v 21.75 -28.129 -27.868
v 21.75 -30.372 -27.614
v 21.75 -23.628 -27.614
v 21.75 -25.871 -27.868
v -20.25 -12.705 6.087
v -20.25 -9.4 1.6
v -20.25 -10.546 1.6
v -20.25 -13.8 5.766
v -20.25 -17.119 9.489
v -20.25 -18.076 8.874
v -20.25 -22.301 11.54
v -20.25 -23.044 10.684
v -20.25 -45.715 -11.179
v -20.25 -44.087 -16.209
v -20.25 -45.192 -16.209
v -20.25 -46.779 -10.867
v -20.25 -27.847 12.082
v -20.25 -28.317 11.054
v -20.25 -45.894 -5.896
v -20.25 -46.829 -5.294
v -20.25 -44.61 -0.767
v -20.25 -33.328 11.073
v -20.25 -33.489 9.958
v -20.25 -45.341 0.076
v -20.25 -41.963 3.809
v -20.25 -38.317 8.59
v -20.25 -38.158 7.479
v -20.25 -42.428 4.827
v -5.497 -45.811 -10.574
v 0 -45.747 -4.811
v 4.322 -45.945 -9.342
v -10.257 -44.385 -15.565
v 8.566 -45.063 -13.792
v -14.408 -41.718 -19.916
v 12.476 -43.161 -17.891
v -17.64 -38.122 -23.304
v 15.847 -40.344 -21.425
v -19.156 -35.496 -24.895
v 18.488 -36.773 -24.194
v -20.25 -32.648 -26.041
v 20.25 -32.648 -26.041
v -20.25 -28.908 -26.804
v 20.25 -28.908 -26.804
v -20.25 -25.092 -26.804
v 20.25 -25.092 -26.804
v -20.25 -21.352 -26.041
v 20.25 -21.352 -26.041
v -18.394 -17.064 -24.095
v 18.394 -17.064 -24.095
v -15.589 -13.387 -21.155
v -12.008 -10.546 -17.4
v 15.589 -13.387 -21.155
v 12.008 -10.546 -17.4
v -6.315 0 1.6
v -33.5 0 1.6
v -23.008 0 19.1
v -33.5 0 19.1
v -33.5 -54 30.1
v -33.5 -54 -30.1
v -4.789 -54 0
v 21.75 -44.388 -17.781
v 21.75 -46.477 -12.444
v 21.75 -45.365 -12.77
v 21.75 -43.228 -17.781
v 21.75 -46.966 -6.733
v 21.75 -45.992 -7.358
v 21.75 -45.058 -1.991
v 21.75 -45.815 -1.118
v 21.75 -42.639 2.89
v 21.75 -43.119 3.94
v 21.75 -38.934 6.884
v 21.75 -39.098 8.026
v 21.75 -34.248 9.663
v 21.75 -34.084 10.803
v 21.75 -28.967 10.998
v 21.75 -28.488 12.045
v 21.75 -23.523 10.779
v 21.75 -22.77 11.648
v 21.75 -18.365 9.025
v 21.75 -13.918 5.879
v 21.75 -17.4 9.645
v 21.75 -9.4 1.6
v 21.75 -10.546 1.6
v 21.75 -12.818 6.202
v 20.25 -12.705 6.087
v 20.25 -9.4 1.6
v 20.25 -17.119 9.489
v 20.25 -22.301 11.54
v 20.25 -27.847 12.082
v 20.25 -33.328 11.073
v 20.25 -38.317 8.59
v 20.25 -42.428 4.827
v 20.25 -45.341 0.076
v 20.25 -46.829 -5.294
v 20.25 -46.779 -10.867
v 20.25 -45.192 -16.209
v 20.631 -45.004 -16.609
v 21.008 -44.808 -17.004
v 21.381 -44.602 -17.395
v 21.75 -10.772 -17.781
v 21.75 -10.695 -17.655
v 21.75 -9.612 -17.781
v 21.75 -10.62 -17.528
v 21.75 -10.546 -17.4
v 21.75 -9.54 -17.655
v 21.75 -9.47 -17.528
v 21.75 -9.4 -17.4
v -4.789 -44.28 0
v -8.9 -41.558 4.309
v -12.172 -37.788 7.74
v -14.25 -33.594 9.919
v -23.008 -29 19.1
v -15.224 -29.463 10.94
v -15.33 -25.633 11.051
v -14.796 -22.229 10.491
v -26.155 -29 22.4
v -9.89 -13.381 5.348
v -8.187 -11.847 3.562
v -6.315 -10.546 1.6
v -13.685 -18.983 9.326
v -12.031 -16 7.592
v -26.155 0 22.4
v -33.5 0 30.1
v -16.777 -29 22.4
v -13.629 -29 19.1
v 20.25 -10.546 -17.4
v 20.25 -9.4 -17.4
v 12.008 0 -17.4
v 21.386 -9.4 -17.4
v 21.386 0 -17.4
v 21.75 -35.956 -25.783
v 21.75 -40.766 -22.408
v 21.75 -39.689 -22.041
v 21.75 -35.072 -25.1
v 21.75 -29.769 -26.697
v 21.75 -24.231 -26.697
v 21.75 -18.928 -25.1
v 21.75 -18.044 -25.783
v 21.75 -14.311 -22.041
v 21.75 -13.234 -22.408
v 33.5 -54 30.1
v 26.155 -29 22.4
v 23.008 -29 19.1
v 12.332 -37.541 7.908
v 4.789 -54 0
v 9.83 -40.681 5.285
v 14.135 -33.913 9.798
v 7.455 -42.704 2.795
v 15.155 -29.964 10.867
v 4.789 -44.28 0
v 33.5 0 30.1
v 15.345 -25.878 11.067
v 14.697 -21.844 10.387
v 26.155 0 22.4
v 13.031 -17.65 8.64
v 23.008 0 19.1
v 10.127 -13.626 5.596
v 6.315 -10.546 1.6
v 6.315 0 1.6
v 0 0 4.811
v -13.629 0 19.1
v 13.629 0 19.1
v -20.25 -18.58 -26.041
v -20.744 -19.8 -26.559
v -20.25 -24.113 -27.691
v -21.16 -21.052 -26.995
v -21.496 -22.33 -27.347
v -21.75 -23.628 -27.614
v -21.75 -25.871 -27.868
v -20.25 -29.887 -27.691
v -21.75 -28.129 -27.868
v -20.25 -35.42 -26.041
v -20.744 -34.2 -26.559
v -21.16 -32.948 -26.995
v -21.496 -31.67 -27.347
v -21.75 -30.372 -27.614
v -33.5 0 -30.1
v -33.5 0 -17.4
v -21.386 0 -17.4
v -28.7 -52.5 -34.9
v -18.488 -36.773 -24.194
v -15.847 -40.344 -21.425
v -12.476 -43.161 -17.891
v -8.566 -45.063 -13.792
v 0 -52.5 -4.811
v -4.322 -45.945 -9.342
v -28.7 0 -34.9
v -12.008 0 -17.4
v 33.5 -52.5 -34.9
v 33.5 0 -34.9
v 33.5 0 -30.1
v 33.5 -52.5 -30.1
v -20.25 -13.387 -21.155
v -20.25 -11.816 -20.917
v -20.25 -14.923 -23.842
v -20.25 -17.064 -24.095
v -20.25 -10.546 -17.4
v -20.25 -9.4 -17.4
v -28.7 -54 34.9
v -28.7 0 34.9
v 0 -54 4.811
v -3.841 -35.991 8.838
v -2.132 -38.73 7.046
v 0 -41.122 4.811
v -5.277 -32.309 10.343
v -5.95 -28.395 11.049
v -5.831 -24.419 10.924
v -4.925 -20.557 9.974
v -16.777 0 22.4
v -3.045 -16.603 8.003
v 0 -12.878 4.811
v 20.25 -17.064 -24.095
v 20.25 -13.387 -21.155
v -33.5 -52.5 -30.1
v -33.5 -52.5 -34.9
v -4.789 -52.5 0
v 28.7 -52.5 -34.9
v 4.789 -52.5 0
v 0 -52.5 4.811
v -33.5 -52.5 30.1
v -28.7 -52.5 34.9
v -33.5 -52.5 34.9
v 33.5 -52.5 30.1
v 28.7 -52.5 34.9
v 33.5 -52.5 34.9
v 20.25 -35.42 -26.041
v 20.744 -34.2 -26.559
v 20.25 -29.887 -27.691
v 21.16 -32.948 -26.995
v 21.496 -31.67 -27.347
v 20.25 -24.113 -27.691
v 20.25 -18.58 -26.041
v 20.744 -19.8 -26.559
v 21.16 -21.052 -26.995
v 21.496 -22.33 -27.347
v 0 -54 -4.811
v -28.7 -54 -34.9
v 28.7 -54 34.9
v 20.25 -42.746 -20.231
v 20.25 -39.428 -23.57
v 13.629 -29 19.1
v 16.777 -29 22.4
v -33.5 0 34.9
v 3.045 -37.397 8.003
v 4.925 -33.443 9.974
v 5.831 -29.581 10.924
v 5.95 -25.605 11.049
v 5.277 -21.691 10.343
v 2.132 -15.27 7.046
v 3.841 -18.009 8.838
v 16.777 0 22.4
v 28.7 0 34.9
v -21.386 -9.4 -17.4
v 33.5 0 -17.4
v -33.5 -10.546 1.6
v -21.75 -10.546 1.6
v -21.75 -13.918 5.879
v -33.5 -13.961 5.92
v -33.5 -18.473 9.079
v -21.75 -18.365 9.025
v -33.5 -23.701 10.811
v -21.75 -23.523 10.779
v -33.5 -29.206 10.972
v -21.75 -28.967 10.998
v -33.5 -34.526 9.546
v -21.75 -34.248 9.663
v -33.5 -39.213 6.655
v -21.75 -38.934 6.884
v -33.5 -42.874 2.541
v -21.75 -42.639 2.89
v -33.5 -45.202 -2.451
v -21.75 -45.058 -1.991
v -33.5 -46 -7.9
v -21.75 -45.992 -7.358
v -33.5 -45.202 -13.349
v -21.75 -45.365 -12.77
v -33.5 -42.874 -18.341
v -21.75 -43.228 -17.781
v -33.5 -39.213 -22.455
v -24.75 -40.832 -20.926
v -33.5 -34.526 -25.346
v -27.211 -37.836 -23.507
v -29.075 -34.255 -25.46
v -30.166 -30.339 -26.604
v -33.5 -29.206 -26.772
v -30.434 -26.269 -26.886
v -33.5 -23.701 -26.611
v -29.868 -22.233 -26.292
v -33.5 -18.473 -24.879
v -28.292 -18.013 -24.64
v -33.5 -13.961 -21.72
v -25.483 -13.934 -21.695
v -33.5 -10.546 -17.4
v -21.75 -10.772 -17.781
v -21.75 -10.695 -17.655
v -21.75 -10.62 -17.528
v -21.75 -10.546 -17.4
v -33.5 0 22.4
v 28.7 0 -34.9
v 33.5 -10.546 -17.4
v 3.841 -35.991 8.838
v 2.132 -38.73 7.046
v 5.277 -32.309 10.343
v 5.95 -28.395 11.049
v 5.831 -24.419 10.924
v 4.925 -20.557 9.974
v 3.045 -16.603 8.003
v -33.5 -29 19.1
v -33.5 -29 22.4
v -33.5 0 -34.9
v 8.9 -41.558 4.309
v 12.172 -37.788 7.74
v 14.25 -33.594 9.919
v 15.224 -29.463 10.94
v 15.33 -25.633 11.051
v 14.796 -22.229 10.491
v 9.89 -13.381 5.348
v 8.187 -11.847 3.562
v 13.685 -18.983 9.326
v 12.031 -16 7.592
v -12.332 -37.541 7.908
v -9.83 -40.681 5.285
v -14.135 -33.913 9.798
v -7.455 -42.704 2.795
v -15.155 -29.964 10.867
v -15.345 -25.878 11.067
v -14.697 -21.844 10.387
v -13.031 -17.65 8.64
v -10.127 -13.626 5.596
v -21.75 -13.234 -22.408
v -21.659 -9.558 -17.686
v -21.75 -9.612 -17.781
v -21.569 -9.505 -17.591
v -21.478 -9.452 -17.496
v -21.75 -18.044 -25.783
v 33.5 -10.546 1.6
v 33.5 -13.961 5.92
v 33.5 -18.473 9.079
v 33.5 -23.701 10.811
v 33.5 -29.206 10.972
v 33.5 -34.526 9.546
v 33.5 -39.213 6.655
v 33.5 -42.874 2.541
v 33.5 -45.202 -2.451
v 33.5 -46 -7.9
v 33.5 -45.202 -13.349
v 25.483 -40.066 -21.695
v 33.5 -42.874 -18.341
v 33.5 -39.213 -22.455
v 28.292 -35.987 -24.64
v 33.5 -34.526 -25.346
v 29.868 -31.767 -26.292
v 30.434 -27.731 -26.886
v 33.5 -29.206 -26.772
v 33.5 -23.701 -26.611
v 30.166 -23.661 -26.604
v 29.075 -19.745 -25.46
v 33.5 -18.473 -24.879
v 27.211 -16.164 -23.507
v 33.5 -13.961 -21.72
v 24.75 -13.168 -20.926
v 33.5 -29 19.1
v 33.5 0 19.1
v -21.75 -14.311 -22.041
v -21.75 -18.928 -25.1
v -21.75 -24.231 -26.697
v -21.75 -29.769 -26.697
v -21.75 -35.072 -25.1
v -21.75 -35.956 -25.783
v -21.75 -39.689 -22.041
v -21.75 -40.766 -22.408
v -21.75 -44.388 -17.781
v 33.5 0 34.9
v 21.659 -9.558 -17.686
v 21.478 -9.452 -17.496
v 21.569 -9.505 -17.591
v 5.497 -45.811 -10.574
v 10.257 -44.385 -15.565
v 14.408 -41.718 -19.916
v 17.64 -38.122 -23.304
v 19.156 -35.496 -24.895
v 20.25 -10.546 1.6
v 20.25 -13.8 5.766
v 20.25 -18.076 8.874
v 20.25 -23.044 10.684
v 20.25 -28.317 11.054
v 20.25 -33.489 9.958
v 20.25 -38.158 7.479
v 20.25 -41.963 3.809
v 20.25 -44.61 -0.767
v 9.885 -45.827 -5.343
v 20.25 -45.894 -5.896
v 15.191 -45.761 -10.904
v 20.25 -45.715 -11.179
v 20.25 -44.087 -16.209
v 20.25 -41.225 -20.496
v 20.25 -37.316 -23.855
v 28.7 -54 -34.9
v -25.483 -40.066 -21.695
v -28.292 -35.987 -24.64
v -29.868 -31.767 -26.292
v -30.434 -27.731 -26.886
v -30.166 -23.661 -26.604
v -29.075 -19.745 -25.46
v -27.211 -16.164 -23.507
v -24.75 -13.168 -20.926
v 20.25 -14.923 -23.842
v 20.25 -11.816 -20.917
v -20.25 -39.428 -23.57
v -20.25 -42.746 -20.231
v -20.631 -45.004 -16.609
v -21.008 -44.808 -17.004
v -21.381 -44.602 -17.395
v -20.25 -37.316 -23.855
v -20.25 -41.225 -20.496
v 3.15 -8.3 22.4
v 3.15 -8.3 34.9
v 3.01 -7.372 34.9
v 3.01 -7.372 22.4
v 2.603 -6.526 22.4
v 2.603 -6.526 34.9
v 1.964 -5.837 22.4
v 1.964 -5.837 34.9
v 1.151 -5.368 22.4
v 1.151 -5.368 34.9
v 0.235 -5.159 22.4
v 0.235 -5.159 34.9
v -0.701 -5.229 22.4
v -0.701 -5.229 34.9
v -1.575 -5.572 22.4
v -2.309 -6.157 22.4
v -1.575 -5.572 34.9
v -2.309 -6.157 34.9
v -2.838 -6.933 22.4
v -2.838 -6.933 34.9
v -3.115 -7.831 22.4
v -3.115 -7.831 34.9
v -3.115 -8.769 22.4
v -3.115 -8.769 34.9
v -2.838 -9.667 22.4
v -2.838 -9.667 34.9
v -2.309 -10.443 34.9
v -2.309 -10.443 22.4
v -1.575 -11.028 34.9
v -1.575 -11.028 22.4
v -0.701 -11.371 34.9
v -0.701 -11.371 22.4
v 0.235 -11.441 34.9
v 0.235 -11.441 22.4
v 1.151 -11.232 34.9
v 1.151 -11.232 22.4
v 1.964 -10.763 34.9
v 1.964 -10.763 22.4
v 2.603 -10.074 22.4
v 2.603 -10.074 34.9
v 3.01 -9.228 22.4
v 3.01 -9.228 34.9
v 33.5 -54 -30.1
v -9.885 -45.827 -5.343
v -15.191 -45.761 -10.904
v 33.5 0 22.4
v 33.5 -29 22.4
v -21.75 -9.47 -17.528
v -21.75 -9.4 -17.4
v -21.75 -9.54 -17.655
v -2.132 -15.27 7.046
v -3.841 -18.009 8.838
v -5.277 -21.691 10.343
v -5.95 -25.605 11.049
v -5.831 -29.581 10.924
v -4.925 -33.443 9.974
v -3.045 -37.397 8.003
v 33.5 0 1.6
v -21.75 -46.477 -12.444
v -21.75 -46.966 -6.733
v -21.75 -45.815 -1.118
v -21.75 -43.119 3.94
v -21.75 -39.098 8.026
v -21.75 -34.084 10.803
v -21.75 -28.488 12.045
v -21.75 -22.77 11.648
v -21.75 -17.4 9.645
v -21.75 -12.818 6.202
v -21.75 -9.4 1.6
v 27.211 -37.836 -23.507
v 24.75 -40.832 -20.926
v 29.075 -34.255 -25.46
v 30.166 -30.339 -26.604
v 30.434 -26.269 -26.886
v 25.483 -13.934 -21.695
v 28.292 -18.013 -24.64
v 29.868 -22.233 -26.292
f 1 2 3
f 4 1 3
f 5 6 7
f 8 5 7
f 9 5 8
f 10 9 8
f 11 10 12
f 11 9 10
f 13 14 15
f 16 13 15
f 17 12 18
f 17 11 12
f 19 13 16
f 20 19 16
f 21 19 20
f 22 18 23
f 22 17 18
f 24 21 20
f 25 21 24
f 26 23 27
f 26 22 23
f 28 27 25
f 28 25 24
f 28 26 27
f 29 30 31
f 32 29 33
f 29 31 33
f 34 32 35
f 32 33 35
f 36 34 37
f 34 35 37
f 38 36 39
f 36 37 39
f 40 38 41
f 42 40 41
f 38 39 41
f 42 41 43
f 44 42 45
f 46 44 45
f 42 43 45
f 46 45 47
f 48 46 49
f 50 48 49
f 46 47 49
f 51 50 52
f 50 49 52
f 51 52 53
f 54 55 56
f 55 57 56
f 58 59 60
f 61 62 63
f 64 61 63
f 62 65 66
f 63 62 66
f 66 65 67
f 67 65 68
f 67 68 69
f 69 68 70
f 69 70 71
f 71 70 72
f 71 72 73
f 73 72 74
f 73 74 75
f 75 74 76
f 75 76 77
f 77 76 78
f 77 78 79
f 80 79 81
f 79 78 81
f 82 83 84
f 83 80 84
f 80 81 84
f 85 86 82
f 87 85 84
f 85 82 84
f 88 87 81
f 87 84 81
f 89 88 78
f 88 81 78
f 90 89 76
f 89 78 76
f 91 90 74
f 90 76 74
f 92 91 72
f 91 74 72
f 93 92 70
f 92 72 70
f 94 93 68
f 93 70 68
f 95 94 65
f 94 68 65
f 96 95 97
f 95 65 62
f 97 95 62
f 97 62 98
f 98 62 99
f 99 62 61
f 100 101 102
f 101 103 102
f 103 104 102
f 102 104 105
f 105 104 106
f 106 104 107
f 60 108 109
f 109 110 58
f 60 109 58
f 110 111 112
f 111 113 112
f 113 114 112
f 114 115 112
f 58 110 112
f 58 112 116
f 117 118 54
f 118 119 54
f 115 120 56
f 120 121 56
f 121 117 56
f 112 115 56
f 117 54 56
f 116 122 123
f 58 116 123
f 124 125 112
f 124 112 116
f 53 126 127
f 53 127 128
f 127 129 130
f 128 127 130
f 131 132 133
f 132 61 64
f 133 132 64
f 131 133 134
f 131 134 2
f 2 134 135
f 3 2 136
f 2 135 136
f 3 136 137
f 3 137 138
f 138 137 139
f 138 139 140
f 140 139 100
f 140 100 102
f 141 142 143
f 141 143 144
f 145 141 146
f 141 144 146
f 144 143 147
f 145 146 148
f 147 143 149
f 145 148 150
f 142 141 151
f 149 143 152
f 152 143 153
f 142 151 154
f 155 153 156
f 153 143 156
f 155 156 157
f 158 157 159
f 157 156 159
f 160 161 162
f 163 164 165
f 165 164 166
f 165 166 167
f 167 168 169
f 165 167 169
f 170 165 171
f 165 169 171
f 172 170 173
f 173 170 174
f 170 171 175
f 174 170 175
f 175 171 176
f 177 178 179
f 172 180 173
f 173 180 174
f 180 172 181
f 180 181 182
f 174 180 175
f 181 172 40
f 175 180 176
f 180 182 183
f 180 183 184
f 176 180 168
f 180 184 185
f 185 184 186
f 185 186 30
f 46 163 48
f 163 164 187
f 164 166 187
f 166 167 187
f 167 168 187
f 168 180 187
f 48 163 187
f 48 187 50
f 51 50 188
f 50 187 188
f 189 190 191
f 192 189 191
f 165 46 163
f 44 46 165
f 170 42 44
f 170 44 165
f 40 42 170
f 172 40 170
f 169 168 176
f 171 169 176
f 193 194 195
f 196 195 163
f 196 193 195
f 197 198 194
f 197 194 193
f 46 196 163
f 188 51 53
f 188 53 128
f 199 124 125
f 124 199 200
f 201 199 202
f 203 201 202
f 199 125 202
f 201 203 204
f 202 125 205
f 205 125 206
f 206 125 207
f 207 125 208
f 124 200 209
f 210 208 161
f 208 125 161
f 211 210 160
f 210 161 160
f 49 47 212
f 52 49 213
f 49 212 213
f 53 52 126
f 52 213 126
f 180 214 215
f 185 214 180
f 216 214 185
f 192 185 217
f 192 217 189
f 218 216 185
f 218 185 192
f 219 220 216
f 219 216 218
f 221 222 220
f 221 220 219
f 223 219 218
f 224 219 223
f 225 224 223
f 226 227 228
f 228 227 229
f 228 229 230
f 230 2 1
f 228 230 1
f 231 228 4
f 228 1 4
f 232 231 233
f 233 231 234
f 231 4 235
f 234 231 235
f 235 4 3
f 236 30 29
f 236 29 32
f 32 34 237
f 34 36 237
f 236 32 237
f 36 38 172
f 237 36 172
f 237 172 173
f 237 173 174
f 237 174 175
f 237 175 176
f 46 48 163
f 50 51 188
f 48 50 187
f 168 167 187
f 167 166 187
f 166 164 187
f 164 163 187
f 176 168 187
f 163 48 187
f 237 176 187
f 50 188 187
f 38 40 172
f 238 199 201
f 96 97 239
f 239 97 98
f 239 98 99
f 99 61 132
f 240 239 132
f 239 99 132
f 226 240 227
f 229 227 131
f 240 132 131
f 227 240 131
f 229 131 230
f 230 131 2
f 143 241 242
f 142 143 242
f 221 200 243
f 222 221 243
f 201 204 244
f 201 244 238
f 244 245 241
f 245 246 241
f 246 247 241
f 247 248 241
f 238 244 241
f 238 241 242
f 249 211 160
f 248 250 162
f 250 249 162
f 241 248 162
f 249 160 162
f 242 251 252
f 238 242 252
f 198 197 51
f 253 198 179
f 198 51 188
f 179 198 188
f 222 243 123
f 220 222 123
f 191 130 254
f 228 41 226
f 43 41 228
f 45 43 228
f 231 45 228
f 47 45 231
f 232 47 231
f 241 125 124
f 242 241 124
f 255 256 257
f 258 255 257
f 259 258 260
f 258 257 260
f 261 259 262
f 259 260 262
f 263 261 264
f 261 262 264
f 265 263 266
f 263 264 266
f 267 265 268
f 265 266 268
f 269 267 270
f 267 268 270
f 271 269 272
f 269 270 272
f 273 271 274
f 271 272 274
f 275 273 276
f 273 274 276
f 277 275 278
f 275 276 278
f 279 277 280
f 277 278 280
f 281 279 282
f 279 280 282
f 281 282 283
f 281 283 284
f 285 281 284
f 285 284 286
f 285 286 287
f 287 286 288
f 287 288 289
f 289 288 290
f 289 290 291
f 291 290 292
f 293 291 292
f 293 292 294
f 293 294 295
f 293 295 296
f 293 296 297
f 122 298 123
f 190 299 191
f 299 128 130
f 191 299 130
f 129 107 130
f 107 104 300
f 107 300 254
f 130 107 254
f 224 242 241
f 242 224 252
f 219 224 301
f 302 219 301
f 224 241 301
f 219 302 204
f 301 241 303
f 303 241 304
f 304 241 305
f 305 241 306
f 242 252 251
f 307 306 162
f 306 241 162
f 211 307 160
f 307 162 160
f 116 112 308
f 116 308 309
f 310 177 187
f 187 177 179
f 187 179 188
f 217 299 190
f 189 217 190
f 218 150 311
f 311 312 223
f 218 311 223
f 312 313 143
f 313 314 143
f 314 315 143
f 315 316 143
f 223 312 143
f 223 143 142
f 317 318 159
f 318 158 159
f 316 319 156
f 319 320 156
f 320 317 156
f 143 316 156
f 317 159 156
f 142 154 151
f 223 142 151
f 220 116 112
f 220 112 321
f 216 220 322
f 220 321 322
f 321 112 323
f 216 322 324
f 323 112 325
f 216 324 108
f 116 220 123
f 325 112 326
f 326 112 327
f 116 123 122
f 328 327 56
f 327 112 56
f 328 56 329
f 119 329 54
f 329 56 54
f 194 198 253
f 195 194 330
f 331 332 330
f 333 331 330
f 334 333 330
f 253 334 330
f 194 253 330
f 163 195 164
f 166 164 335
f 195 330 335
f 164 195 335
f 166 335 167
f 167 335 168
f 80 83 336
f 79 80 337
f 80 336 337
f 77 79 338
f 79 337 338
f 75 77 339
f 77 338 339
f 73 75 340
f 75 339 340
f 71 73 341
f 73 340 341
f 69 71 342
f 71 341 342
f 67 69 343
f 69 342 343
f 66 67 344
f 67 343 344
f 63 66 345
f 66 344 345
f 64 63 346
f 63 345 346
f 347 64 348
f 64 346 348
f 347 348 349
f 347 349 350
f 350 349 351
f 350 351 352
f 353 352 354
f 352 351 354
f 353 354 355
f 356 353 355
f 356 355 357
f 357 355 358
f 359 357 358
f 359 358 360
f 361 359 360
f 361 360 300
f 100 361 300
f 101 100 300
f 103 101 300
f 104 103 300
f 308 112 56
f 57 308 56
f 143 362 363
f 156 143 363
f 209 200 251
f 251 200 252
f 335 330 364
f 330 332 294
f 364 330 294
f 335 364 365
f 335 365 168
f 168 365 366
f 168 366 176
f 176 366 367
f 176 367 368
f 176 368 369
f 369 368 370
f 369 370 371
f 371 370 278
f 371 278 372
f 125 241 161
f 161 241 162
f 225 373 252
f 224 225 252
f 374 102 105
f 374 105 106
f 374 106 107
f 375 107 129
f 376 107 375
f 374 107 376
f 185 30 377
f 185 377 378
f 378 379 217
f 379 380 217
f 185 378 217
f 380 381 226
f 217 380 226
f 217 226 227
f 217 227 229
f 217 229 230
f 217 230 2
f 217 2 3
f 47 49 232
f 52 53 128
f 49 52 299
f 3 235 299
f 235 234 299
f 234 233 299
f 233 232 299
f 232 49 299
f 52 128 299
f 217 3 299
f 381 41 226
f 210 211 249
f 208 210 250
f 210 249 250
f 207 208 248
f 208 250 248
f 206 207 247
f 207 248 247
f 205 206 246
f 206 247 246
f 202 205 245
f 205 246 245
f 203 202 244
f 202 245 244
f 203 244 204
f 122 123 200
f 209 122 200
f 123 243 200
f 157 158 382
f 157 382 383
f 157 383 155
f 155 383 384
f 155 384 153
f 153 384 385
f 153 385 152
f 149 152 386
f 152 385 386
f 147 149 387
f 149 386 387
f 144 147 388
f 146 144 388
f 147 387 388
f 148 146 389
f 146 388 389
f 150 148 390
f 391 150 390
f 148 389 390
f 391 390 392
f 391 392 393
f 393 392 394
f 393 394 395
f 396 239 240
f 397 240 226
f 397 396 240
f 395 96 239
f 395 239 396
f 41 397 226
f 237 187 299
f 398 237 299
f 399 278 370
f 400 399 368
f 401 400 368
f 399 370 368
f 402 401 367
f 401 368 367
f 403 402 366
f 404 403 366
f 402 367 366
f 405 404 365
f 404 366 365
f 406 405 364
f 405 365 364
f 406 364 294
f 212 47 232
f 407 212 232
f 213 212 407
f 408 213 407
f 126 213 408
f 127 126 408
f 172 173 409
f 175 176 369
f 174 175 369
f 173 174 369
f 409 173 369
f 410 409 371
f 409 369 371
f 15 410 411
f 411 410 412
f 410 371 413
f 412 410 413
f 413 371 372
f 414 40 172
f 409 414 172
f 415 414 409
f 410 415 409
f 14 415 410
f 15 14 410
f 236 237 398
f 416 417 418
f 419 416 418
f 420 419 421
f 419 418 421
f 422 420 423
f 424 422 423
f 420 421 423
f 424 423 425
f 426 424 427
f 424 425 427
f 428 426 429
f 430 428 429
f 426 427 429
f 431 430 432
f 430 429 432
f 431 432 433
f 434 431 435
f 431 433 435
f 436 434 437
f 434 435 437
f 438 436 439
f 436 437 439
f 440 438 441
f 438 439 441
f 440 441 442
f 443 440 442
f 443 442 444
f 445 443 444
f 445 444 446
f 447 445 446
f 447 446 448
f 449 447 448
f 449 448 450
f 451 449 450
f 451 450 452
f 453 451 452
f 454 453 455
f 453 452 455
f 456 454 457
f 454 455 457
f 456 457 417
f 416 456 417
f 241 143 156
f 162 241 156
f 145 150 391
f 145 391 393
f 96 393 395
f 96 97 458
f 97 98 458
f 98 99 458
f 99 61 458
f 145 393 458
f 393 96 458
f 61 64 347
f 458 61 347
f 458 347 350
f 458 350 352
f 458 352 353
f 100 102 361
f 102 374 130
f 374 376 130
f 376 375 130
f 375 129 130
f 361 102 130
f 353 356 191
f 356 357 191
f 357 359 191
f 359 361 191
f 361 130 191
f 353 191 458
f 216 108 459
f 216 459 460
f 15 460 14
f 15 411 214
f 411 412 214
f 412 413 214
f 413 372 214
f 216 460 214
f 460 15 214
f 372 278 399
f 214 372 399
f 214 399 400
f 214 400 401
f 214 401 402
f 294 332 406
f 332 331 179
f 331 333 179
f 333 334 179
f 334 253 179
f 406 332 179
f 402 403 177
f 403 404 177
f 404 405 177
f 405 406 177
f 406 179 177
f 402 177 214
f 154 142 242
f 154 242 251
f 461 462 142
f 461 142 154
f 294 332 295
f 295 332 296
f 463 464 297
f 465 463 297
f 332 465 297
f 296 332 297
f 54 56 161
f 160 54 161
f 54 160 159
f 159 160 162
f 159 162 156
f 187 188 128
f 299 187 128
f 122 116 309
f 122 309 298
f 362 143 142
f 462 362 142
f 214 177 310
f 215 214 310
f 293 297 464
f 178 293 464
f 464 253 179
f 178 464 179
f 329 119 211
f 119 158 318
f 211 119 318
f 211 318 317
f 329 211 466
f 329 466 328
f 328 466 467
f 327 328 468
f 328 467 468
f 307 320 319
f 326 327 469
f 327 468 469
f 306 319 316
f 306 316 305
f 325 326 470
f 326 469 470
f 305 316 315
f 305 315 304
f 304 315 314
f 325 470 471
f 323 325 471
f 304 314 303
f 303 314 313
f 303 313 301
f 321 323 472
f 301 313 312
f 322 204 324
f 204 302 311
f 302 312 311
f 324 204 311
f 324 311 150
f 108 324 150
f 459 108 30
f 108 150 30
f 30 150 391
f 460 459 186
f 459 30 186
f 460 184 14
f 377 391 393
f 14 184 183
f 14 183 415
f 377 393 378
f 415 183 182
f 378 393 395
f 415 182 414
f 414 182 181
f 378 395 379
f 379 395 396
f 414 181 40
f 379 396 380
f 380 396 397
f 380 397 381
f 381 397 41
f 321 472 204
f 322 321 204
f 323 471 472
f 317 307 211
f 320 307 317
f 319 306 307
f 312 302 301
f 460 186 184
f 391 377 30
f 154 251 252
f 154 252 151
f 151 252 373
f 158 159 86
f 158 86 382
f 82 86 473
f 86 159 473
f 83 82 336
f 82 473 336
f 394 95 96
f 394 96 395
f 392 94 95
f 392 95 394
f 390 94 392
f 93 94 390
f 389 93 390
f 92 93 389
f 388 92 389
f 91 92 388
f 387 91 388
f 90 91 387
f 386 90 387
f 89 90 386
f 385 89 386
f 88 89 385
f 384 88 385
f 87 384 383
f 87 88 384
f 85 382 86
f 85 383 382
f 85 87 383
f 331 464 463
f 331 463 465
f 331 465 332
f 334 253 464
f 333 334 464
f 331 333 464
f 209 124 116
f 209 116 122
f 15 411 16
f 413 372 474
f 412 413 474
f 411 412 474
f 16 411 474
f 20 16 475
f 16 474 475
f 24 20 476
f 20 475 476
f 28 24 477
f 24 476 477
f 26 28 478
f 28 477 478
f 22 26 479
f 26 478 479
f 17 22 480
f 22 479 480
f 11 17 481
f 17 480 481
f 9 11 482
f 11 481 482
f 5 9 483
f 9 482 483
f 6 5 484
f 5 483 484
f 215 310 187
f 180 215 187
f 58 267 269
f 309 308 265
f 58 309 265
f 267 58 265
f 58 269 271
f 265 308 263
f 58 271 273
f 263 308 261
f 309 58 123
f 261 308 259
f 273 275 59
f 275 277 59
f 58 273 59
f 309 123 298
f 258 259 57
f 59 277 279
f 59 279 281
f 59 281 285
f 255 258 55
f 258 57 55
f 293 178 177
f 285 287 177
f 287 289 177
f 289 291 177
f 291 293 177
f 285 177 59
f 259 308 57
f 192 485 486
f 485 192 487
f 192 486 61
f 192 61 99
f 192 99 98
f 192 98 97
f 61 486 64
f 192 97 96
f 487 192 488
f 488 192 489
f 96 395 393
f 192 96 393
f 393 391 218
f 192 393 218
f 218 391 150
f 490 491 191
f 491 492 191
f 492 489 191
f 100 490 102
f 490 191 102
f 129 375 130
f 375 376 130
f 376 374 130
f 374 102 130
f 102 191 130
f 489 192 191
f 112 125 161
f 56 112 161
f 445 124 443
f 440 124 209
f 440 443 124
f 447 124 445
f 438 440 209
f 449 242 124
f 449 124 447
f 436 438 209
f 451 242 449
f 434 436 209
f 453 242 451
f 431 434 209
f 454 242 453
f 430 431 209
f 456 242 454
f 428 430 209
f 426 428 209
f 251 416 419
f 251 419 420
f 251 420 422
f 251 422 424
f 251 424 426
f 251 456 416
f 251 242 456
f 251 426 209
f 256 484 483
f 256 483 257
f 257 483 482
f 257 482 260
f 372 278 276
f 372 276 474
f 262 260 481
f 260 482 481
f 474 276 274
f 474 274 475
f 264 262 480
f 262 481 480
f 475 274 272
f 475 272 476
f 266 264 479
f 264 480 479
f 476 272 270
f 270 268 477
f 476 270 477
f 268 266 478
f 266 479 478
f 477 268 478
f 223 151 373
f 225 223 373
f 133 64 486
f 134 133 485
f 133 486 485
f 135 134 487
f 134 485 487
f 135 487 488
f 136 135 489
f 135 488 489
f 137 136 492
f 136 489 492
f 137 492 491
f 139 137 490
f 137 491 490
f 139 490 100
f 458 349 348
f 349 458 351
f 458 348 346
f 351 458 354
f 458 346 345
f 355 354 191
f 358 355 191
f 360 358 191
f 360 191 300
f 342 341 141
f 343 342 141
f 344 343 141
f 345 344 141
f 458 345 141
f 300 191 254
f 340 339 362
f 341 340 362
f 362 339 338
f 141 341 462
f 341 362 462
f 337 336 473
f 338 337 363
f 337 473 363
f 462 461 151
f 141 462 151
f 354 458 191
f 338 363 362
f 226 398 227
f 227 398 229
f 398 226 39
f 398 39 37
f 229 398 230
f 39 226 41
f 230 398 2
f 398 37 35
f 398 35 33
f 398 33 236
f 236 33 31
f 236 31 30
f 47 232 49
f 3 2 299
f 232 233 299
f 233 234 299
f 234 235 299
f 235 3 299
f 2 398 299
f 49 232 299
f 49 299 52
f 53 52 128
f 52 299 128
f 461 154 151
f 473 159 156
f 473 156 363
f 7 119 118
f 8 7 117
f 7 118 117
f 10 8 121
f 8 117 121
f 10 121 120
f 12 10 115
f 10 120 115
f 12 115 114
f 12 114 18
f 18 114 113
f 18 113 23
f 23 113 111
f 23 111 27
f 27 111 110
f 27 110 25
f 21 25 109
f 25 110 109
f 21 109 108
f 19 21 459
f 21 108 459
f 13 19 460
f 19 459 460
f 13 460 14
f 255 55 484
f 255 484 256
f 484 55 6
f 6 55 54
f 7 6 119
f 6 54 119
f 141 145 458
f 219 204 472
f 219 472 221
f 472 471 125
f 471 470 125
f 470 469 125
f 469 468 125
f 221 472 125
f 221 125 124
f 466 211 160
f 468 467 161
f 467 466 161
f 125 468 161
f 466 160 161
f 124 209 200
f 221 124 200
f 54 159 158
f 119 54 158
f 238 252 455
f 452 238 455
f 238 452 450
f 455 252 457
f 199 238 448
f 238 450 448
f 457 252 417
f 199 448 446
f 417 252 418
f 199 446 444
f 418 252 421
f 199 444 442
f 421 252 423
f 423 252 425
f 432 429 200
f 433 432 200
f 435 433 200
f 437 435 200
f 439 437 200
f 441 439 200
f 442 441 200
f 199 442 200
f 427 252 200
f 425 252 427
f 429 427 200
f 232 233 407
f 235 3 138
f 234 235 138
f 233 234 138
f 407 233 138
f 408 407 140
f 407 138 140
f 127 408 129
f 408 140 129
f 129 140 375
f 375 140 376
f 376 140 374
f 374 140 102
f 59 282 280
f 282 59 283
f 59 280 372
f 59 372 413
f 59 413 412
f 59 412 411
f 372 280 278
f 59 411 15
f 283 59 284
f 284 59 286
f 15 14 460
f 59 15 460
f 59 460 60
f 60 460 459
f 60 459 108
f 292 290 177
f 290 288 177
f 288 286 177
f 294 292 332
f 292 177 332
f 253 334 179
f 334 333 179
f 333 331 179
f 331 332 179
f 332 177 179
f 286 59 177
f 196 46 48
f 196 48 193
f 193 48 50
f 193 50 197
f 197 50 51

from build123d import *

# Parameters (mm, degrees)
F1_DEPTH  = 54
F2_DEPTH  = 52.5
F4_W      = 29
F4_H      = 3.3
F5_DEPTH  = 67
F7_R      = 3.15
F8_DEPTH  = 12.5
F10_R     = 20
F11_DEPTH = 0.75
F13_R     = 20
F14_DEPTH = 0.75


with BuildPart() as f1:
    # F0 (on Front) → F1 (new body)
    with BuildSketch(Plane.XZ):
        Polygon((-4.7893472947, 0), (-33.5, 30.1), (-33.5, -30.1), align=None)
    extrude(amount=F1_DEPTH)


with BuildPart() as f1b:
    # F0 (on Front) → F1, piece 2 (new body)
    with BuildSketch(Plane.XZ):
        Polygon((0, 4.8111682041), (28.7, 34.9), (-28.7, 34.9), align=None)
    extrude(amount=F1_DEPTH)


with BuildPart() as f1c:
    # F0 (on Front) → F1, piece 3 (new body)
    with BuildSketch(Plane.XZ):
        Polygon((33.5, -30.1), (33.5, 30.1), (4.7893472947, 0), align=None)
    extrude(amount=F1_DEPTH)


with BuildPart() as f1d:
    # F0 (on Front) → F1, piece 4 (new body)
    with BuildSketch(Plane.XZ):
        Polygon((-28.7, -34.9), (28.7, -34.9), (0, -4.8111682041), align=None)
    extrude(amount=F1_DEPTH)


with BuildPart() as f2:
    # F0 (on Front) → F2 (new body)
    with BuildSketch(Plane.XZ):
        Polygon((33.5, 30.1), (33.5, 34.9), (28.7, 34.9), (0, 4.8111682041), (-28.7, 34.9), (-33.5, 34.9), (-33.5, 30.1), (-4.7893472947, 0), (-33.5, -30.1), (-33.5, -34.9), (-28.7, -34.9), (0, -4.8111682041), (28.7, -34.9), (33.5, -34.9), (33.5, -30.1), (4.7893472947, 0), align=None)
    extrude(amount=F2_DEPTH)


with BuildPart() as f5_tool:
    # F4 (on offset) → F5 (new body)
    with BuildSketch(Plane.YZ.offset(33.5)):
        with Locations((-14.5, 20.75)):
            Rectangle(F4_W, F4_H)
        with BuildLine():
            ThreePointArc((-10.5455173281, -17.4), (-8.6474093005, -12.8175618569), (-8, -7.9))
            ThreePointArc((-8, -7.9), (-8.6474093005, -2.9824381431), (-10.5455173281, 1.6))
            ThreePointArc((-10.5455173281, 1.6), (-46, -7.9), (-10.5455173281, -17.4))
        make_face()
        with BuildLine():
            ThreePointArc((-10.5455173281, 1.6), (-8.6474093005, -2.9824381431), (-8, -7.9))
            ThreePointArc((-8, -7.9), (-8.6474093005, -12.8175618569), (-10.5455173281, -17.4))
            Line((-10.5455173281, -17.4), (0, -17.4))
            Line((0, -17.4), (0, 1.6))
            Line((0, 1.6), (-10.5455173281, 1.6))
        make_face()
    extrude(amount=-F5_DEPTH)


with BuildPart() as f1_1:
    add(f1.part)

    # F5: cut by f5_tool
    add(f5_tool.part, mode=Mode.SUBTRACT)


with BuildPart() as f1b_1:
    add(f1b.part)

    # F5: cut by f5_tool
    add(f5_tool.part, mode=Mode.SUBTRACT)

    # F7 (on offset) → F8 (cut)
    with BuildSketch(Plane.XY.offset(34.9)):
        with Locations((0, -8.3)):
            Circle(F7_R)
    extrude(amount=-F8_DEPTH, mode=Mode.SUBTRACT)


with BuildPart() as f1c_1:
    add(f1c.part)

    # F5: cut by f5_tool
    add(f5_tool.part, mode=Mode.SUBTRACT)


with BuildPart() as f1d_1:
    add(f1d.part)

    # F5: cut by f5_tool
    add(f5_tool.part, mode=Mode.SUBTRACT)


with BuildPart() as f2_1:
    add(f2.part)

    # F5: cut by f5_tool
    add(f5_tool.part, mode=Mode.SUBTRACT)


with BuildPart() as f11_tool:
    # F10 (on offset) → F11 (new body, symmetric)
    with BuildSketch(Plane.YZ.offset(21)):
        with Locations((-27, -7.9)):
            Circle(F10_R)
    extrude(amount=F11_DEPTH, both=True)


with BuildPart() as f1c_2:
    add(f1c_1.part)

    # F11: cut by f11_tool
    add(f11_tool.part, mode=Mode.SUBTRACT)


with BuildPart() as f1d_2:
    add(f1d_1.part)

    # F11: cut by f11_tool
    add(f11_tool.part, mode=Mode.SUBTRACT)


with BuildPart() as f2_2:
    add(f2_1.part)

    # F11: cut by f11_tool
    add(f11_tool.part, mode=Mode.SUBTRACT)


with BuildPart() as f14_tool:
    # F13 (on offset) → F14 (new body, symmetric)
    with BuildSketch(Plane(origin=(-21, 0, 0), x_dir=(0, -1, 0), z_dir=(-1, 0, 0))):
        with Locations((27, -7.9)):
            Circle(F13_R)
    extrude(amount=F14_DEPTH, both=True)


with BuildPart() as f1_2:
    add(f1_1.part)

    # F14: cut by f14_tool
    add(f14_tool.part, mode=Mode.SUBTRACT)


with BuildPart() as f1d_3:
    add(f1d_2.part)

    # F14: cut by f14_tool
    add(f14_tool.part, mode=Mode.SUBTRACT)


with BuildPart() as f2_3:
    add(f2_2.part)

    # F14: cut by f14_tool
    add(f14_tool.part, mode=Mode.SUBTRACT)


solid = Compound([f1b_1.part, f1c_2.part, f1_2.part, f1d_3.part, f2_3.part])
